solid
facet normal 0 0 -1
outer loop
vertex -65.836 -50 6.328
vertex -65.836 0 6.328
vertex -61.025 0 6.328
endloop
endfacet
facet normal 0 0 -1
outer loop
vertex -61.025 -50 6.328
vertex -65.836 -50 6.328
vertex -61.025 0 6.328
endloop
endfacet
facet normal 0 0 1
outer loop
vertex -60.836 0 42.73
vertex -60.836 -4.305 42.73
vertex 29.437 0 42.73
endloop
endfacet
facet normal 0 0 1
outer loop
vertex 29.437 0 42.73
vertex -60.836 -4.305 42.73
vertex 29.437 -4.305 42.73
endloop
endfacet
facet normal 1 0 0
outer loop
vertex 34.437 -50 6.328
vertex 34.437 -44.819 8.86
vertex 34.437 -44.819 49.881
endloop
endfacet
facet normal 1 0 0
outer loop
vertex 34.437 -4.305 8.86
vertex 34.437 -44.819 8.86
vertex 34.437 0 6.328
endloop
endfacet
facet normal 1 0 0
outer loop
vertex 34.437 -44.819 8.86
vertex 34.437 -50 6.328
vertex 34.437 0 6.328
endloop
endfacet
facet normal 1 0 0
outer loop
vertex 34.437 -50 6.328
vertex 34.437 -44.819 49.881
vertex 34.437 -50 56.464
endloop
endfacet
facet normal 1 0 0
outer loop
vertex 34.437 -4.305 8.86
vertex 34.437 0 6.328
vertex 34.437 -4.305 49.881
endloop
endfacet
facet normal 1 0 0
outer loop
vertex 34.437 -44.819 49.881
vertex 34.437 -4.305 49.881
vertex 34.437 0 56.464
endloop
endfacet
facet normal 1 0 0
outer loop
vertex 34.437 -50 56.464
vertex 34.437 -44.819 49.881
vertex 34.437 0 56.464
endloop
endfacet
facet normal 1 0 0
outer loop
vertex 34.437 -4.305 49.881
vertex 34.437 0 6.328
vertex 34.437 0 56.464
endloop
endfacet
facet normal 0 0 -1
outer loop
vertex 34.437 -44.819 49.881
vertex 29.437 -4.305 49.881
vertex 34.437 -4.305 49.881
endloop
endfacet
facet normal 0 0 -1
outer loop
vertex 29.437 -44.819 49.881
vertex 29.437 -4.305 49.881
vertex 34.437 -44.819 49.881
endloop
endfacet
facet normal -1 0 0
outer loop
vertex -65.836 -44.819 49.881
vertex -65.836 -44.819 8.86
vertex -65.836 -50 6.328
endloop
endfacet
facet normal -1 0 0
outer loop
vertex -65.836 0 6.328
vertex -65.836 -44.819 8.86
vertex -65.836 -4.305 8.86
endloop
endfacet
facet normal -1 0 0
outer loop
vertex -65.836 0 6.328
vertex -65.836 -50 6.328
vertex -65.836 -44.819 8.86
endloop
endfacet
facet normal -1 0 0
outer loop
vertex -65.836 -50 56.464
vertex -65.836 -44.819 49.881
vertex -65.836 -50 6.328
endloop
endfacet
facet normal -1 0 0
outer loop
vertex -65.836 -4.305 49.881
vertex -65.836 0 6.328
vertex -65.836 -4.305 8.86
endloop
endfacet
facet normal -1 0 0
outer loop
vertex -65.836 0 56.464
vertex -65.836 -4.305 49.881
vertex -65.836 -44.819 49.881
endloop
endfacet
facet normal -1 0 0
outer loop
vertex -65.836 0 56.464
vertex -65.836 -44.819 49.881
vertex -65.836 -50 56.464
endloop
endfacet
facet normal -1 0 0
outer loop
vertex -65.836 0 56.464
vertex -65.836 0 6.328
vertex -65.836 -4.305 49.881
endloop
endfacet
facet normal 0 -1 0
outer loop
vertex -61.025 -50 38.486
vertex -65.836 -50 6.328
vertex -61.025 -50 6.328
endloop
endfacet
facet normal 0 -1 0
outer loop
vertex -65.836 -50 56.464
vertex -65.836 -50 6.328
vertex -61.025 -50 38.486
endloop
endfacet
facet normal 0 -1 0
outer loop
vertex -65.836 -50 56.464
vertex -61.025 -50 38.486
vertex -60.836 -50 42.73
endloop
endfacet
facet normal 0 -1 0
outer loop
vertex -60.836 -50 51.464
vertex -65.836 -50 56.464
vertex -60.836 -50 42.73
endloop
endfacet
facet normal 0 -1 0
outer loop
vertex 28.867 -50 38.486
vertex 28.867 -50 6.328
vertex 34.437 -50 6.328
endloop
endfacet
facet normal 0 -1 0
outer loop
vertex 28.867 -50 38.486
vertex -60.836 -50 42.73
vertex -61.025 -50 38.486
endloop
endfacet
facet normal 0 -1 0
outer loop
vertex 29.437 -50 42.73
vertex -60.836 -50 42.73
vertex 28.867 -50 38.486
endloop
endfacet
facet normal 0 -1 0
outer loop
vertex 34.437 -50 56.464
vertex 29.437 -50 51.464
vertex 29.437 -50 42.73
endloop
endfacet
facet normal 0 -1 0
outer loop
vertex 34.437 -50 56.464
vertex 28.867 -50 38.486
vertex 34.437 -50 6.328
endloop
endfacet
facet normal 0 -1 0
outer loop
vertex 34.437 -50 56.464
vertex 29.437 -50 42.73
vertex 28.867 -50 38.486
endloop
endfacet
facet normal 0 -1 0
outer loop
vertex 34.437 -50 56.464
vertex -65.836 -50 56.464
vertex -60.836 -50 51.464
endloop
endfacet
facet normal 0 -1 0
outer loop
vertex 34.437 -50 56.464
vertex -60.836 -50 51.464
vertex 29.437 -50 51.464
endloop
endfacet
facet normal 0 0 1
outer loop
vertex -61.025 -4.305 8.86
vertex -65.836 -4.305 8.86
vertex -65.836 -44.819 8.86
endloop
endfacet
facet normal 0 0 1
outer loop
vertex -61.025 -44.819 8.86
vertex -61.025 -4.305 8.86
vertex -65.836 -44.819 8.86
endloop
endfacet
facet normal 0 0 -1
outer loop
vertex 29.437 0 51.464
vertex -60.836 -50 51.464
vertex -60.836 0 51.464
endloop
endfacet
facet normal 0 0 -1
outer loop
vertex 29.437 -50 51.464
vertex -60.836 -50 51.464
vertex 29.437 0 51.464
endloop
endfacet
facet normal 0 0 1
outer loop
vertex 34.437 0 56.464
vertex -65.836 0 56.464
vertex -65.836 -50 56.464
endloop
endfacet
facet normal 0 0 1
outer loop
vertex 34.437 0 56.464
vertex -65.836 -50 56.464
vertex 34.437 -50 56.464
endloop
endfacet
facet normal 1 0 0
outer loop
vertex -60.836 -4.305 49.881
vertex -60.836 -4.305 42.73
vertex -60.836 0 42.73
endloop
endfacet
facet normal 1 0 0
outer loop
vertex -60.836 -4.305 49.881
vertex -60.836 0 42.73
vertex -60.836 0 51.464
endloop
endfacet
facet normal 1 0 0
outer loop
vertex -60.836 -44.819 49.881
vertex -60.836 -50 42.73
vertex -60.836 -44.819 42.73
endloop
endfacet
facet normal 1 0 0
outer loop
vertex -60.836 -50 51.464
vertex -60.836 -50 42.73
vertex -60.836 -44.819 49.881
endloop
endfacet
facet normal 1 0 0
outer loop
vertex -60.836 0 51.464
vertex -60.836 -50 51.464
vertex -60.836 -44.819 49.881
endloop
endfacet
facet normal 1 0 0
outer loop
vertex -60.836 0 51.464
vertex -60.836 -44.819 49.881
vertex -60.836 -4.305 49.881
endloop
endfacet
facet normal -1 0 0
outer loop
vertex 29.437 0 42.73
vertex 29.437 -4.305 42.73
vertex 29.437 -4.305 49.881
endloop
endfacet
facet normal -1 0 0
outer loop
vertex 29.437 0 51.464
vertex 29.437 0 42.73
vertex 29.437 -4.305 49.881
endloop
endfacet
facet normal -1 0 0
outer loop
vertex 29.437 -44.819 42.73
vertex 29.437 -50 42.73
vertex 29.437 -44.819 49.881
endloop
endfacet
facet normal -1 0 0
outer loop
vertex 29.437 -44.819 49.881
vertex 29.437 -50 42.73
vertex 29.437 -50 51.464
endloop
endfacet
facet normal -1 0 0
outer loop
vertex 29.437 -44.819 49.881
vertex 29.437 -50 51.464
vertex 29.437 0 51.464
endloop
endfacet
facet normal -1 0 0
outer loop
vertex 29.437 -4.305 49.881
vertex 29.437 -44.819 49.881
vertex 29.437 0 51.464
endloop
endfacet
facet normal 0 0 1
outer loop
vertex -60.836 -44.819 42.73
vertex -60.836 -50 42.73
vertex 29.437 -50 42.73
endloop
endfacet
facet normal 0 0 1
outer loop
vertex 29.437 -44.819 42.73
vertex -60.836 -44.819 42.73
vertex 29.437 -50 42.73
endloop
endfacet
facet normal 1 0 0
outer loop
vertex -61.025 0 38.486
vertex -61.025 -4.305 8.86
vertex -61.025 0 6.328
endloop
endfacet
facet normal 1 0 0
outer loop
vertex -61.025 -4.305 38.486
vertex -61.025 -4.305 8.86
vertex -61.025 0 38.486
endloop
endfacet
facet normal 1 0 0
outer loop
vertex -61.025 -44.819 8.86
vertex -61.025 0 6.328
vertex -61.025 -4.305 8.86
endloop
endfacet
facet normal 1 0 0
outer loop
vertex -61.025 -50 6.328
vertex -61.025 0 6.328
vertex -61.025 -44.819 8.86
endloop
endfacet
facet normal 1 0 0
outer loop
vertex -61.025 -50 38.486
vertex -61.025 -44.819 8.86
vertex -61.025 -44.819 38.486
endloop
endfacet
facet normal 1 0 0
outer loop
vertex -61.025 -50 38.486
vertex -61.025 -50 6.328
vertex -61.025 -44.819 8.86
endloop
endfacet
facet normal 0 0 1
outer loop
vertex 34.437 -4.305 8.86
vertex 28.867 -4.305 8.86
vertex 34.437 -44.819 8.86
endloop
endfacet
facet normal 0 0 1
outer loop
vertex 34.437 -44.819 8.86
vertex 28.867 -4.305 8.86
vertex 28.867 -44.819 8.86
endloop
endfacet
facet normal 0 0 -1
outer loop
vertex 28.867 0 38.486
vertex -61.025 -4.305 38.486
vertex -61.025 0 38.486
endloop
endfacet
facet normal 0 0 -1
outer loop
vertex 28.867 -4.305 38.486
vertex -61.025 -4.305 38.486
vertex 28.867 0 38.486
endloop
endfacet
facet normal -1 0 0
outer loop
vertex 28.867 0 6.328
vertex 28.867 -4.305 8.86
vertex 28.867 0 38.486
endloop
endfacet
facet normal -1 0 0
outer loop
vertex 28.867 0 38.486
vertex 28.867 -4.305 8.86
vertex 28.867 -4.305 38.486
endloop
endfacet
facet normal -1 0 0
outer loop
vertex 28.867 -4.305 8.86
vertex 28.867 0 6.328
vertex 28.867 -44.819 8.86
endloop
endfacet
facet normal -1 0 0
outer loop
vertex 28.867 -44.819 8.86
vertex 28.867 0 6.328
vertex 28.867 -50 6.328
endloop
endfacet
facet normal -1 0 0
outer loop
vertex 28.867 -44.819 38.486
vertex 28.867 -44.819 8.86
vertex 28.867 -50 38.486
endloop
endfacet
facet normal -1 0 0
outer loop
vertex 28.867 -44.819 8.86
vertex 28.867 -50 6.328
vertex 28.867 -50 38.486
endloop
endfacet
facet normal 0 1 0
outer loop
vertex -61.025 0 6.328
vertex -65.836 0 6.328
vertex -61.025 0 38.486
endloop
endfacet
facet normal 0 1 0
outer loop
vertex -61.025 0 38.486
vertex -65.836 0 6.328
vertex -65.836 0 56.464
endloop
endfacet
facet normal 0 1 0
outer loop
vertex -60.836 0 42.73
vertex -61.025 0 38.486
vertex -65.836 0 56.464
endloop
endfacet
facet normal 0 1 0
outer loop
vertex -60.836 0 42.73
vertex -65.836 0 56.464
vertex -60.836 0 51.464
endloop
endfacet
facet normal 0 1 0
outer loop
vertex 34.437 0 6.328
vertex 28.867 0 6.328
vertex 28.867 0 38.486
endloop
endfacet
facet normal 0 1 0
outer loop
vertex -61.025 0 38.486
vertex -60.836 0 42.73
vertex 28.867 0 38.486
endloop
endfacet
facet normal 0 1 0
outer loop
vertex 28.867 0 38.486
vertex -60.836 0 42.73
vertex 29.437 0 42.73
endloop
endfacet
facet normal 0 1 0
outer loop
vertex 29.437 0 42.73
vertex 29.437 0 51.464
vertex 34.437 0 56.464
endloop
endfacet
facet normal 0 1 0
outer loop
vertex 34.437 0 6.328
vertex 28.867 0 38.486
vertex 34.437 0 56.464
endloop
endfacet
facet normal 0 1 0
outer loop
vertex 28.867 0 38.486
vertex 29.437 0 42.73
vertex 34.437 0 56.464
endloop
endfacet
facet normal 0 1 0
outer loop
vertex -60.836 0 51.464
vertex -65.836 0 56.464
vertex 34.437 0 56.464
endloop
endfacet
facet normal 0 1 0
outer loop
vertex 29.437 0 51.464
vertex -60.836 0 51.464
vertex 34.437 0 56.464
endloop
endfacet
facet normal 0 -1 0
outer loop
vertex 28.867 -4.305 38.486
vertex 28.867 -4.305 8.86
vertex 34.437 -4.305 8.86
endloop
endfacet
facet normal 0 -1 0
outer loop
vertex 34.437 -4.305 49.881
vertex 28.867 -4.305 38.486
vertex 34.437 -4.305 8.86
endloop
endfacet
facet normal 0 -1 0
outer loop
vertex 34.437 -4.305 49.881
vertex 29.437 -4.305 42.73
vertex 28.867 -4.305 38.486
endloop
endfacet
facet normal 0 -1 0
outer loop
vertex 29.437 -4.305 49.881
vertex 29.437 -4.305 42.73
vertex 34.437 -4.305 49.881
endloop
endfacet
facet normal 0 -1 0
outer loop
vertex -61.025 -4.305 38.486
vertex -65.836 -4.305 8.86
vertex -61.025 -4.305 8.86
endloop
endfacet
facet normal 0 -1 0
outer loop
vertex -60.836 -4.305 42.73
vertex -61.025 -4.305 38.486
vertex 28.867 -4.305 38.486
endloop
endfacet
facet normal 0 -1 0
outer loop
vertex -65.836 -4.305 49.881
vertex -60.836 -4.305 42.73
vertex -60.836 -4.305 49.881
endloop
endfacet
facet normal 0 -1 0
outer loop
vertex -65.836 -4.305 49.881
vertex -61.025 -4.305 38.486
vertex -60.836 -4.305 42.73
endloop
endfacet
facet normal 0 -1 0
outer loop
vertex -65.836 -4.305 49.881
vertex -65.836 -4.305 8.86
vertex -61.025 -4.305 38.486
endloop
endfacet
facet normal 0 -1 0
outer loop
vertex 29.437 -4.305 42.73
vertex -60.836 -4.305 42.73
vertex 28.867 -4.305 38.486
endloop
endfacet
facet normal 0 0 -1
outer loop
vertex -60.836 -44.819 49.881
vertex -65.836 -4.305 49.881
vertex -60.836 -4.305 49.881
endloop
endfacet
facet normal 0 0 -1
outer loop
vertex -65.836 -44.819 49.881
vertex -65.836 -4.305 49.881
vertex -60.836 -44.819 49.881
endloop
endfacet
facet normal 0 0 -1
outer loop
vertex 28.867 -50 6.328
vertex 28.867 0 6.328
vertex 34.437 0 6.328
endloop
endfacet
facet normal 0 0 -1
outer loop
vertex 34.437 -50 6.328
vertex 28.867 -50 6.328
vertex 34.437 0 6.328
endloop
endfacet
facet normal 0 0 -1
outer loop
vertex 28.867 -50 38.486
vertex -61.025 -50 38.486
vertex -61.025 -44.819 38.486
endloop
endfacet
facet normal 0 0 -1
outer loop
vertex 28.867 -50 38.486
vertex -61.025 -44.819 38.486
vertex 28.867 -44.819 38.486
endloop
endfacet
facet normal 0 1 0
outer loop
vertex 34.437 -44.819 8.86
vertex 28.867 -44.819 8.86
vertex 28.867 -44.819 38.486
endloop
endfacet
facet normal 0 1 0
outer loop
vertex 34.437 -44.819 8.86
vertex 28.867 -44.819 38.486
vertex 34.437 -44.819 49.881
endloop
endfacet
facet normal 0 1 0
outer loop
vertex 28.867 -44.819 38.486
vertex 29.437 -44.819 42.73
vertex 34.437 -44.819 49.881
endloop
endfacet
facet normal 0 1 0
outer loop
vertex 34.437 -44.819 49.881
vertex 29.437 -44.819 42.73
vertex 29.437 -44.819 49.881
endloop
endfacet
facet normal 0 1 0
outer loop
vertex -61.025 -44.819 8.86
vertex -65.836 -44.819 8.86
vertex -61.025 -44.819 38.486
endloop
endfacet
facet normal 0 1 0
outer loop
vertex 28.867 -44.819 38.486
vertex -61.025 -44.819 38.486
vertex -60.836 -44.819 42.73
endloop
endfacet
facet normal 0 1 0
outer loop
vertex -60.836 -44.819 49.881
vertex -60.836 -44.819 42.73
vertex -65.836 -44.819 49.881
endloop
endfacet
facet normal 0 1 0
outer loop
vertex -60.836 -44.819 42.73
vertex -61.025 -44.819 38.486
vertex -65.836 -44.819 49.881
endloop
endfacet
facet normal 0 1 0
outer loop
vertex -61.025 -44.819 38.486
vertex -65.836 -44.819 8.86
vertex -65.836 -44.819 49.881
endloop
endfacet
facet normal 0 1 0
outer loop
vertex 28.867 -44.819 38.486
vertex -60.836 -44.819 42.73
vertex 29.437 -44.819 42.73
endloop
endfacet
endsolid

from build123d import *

# Parameters (mm, degrees)
F0_W     = 100.2733111382
F0_H     = 50.1366546378
F1_DEPTH = 50
F2_W     = 90.2733111382
F2_H     = 8.7347067715
F3_DEPTH = 50.001
F5_W     = 40.5144635588
F5_H     = 41.020902805
F6_DEPTH = 100.2743111382
F7_W     = 89.8914821446
F7_H     = 32.1583626792
F8_DEPTH = 50.001


with BuildPart() as f1:
    # F0 (on Front) → F1 (new body)
    with BuildSketch(Plane.XZ):
        with Locations((-15.6993567944, 31.3960765488)):
            Rectangle(F0_W, F0_H)
    extrude(amount=F1_DEPTH)

    # F2 (on face) → F3 (cut, through all)
    with BuildSketch(Plane.XZ.offset(50)):
        with Locations((-15.6993567944, 47.097050482)):
            Rectangle(F2_W, F2_H)
    extrude(amount=-F3_DEPTH, mode=Mode.SUBTRACT)

    # F5 (on face) → F6 (cut, through all)
    with BuildSketch(Plane(origin=(-65.8360123634, 0, 0), x_dir=(0, -1, 0), z_dir=(-1, 0, 0))):
        with Locations((24.5618959889, 29.3703549542)):
            Rectangle(F5_W, F5_H)
    extrude(amount=-F6_DEPTH, mode=Mode.SUBTRACT)

    # F7 (on face) → F8 (cut, through all)
    with BuildSketch(Plane.XZ.offset(50)):
        with Locations((-16.0791818053, 22.4069305696)):
            Rectangle(F7_W, F7_H)
    extrude(amount=-F8_DEPTH, mode=Mode.SUBTRACT)


solid = f1.part
